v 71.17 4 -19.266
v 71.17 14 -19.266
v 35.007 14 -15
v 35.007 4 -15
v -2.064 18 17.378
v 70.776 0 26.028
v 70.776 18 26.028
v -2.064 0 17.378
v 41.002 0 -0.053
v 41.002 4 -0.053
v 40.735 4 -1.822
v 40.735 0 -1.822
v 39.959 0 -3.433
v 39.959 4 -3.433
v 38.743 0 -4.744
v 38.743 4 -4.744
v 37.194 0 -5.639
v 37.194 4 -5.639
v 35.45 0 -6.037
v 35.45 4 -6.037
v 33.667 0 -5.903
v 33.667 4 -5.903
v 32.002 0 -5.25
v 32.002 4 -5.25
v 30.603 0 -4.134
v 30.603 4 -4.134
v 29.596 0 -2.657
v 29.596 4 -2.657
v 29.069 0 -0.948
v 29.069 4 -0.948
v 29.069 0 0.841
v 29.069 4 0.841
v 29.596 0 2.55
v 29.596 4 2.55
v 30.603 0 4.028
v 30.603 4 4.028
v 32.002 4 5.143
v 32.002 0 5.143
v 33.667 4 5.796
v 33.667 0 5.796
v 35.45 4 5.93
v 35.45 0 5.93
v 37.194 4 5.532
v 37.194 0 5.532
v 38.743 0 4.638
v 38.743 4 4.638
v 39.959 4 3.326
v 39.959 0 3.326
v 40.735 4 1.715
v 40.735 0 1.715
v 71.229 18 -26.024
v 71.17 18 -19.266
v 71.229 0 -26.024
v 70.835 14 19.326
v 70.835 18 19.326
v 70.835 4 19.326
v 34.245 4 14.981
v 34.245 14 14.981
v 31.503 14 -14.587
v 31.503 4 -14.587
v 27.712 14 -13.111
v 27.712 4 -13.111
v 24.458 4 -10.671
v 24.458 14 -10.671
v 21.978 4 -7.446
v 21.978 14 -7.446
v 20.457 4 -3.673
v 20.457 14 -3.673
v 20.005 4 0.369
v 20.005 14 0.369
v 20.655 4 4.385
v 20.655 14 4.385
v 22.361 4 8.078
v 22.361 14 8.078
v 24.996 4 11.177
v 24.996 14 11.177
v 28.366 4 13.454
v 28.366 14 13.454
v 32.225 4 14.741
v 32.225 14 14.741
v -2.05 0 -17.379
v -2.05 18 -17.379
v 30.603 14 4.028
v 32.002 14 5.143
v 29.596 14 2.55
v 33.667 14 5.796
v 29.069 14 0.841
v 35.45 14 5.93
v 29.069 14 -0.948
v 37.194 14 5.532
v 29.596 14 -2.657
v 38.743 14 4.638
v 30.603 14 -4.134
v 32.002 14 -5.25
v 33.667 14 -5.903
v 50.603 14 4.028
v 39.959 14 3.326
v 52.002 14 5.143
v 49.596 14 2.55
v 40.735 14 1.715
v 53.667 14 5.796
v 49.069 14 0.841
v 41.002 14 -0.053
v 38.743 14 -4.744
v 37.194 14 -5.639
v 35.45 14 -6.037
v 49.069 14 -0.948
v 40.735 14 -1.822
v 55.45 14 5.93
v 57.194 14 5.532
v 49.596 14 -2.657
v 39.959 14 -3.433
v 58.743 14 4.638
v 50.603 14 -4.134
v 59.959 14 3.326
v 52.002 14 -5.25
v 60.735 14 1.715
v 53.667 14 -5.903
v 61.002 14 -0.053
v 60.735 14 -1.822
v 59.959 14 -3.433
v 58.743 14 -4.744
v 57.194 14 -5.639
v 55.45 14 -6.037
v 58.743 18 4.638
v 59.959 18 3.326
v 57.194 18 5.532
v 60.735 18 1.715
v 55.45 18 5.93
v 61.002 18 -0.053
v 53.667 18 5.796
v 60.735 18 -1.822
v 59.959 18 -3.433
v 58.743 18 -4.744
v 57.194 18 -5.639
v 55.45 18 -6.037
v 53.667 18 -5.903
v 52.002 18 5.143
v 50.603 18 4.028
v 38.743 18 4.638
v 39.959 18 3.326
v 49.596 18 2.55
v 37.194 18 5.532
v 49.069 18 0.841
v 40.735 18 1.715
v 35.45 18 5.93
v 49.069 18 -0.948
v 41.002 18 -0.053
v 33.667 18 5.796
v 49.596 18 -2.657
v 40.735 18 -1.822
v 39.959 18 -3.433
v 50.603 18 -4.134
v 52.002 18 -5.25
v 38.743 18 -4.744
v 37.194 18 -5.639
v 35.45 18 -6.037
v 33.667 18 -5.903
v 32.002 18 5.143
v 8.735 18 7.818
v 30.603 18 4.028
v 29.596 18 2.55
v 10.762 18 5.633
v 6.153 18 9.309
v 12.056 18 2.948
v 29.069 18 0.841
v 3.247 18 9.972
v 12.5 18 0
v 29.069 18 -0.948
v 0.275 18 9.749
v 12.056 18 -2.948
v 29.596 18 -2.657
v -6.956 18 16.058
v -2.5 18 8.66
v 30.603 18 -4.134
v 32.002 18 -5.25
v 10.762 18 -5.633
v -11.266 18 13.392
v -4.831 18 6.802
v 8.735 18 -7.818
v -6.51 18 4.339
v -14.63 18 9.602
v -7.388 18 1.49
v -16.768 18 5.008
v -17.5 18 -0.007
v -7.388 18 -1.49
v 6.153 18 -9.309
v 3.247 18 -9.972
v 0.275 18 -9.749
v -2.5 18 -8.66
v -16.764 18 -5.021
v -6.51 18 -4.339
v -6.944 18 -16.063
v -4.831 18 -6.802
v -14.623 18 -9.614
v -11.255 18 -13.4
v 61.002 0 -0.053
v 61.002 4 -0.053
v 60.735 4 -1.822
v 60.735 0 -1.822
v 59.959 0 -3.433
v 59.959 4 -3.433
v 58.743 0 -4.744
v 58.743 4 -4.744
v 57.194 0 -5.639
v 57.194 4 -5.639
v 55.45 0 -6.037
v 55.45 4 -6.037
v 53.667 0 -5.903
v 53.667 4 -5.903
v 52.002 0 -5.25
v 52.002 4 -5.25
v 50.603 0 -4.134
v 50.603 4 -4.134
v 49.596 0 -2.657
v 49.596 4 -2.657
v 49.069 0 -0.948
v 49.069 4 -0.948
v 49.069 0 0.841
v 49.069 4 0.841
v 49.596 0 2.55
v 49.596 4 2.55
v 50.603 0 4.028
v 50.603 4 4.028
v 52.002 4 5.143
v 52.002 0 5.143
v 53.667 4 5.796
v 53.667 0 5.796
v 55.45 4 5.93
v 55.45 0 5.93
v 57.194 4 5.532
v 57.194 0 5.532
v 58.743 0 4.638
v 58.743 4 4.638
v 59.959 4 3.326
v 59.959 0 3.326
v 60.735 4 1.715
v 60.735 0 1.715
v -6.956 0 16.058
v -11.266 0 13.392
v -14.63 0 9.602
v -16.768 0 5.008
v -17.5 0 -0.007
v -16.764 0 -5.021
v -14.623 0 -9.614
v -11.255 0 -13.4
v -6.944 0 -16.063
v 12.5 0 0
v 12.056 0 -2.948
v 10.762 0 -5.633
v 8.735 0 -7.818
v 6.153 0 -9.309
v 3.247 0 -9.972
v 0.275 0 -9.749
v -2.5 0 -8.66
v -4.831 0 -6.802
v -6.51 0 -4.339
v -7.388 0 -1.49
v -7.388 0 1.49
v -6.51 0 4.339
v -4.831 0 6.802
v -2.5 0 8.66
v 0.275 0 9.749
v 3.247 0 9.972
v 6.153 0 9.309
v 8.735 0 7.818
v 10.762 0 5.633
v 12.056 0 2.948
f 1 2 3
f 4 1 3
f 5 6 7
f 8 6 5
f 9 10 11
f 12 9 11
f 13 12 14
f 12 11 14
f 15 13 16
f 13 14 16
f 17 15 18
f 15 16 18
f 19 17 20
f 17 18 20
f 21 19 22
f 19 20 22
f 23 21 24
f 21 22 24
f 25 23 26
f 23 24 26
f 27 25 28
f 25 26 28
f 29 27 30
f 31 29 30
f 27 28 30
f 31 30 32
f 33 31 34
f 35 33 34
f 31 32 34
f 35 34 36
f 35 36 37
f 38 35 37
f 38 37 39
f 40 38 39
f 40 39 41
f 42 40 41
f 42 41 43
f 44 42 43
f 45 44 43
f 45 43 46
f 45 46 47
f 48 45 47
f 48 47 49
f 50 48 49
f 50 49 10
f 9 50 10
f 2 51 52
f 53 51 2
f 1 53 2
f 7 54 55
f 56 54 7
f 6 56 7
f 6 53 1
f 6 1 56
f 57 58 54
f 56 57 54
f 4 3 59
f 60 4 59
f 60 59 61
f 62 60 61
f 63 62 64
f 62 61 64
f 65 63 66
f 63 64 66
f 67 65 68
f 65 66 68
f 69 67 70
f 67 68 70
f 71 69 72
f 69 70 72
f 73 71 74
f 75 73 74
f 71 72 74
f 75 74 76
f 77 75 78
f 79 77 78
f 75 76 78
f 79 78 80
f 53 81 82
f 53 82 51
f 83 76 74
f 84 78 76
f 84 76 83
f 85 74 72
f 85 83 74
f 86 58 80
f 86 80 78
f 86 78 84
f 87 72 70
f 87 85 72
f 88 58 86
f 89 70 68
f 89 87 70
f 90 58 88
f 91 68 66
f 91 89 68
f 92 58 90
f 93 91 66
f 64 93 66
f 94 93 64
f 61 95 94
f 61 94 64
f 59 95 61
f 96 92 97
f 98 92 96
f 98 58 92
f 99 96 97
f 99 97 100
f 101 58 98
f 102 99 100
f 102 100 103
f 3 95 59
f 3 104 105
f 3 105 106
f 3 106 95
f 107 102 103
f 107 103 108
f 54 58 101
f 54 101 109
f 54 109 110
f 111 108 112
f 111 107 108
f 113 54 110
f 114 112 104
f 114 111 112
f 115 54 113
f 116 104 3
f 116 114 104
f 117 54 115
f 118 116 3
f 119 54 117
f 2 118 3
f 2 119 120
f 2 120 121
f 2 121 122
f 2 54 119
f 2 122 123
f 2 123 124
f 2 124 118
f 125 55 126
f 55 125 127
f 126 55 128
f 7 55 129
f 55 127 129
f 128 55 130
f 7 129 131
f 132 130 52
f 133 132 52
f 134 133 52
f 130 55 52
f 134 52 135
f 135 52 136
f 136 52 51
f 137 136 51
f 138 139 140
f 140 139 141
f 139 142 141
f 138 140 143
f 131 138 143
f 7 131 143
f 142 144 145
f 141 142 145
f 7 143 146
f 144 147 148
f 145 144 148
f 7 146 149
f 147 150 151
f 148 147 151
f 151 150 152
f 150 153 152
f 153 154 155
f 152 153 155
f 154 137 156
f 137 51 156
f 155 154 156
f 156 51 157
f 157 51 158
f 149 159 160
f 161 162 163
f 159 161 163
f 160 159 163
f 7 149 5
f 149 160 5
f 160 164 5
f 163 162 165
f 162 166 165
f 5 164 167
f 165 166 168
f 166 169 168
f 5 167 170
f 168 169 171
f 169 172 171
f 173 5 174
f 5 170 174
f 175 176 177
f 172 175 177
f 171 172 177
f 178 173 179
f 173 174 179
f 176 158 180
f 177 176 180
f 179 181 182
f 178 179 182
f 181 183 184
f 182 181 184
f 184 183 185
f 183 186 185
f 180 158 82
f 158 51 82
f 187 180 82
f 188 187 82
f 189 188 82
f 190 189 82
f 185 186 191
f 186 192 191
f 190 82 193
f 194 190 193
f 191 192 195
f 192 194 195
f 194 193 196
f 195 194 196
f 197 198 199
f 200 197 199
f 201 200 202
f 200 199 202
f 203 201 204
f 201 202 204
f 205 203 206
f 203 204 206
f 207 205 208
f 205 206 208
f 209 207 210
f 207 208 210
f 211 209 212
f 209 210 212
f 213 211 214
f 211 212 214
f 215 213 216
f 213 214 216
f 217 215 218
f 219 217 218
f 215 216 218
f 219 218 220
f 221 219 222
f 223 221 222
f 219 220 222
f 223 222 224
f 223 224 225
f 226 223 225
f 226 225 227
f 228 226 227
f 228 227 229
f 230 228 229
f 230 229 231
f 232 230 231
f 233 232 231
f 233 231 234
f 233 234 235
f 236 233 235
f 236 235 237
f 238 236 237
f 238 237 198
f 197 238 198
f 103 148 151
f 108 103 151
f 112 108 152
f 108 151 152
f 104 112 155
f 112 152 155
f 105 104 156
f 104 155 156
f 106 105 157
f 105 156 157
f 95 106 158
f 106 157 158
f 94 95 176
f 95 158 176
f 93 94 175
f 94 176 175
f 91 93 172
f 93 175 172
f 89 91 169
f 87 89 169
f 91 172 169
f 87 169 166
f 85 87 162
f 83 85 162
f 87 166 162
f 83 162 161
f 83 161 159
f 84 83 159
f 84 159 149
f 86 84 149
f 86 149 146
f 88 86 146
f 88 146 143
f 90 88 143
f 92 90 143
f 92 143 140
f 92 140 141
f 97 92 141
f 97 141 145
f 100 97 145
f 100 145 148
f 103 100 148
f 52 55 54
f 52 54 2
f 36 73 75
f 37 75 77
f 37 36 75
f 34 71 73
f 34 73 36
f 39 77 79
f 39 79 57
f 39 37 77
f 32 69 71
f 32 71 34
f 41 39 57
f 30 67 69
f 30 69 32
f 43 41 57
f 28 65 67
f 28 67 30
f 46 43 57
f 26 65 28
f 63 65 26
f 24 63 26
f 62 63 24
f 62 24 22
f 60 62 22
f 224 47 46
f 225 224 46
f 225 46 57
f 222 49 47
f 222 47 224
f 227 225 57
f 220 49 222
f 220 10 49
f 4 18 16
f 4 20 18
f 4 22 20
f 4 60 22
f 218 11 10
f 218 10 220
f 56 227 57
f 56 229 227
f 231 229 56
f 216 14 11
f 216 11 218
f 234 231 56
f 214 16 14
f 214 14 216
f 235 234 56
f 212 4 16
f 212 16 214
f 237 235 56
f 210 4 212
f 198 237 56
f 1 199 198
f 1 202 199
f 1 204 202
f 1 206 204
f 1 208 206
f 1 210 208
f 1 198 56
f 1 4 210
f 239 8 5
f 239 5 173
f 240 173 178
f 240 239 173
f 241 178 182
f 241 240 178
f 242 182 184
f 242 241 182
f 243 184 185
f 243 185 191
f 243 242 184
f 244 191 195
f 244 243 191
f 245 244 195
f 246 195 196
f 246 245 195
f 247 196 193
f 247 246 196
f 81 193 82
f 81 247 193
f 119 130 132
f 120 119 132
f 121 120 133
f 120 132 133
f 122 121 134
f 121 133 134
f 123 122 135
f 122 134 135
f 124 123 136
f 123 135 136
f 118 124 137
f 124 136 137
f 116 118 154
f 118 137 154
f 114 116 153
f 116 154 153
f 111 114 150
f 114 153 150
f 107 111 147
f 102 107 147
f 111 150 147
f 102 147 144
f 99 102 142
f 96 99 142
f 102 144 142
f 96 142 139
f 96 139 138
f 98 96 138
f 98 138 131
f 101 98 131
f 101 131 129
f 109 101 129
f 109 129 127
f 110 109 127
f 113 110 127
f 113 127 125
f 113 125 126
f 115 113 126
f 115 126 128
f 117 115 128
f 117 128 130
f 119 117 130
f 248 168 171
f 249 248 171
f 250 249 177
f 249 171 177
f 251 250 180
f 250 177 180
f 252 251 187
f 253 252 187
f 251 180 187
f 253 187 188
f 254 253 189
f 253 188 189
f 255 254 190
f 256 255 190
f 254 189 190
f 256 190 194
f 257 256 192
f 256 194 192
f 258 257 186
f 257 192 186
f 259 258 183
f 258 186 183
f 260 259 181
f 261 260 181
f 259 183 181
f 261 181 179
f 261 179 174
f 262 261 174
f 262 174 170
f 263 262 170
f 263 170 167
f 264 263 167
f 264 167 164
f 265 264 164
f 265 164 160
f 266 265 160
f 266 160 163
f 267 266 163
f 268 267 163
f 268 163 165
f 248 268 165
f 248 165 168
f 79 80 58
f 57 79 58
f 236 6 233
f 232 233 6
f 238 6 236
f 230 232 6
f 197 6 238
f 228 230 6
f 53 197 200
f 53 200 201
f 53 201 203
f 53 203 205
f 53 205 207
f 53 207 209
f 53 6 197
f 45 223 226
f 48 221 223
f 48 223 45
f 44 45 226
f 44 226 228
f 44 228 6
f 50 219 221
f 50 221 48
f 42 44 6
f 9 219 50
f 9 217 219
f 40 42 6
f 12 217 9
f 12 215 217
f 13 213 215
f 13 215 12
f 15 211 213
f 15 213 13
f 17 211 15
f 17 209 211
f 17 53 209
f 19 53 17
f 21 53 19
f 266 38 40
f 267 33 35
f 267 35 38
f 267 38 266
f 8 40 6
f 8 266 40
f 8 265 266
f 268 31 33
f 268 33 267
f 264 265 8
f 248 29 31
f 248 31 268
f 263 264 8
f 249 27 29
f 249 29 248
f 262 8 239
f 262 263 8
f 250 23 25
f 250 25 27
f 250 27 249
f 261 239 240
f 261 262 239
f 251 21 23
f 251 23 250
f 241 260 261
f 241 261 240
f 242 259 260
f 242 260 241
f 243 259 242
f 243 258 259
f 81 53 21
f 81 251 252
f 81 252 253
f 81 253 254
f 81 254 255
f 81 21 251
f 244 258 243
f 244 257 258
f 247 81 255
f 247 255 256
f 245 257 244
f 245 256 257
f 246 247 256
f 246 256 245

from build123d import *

# Parameters (mm, degrees)
BOSS_EXTRUDE1_DEPTH = 18
CUT_EXTRUDE1_DEPTH  = 14
SKETCH5_W           = 38.6
SKETCH5_H           = 4
BOSS_EXTRUDE2_DEPTH = 51.5
SKETCH6_R           = 10
CUT_EXTRUDE2_DEPTH  = 200
SKETCH7_R           = 6
CUT_EXTRUDE3_DEPTH  = 200


with BuildPart() as part:
    # Sketch2 → Boss-Extrude1 (new body)
    with BuildSketch(Plane(origin=(0, 0, 0), x_dir=(1, 0, 0), z_dir=(0, 1, 0))):
        with BuildLine():
            Line((-2.050203312, 17.379489819), (71.229085812, 26.024015225))
            Line((71.229085812, 26.024015225), (70.776256856, -26.027550211))
            Line((70.776256856, -26.027550211), (-2.063605293, -17.37790359))
            ThreePointArc((-2.063605293, -17.37790359), (-17.499998699, 0.006747763), (-2.050203312, 17.379489819))
        make_face()
    extrude(amount=BOSS_EXTRUDE1_DEPTH)

    # Sketch4 → Cut-Extrude1 (cut)
    with BuildSketch(Plane(origin=(0, 18, 0), x_dir=(1, 0, 0), z_dir=(0, 1, 0))):
        with BuildLine():
            Line((35.006766585, 14.999998474), (31.502988077, 14.586668832))
            ThreePointArc((31.502988077, 14.586668832), (20.004544926, -0.369225031), (32.22510993, -14.741098504))
            Line((32.22510993, -14.741098504), (34.245425362, -14.981008548))
            Line((34.245425362, -14.981008548), (70.834558469, -19.325924398))
            Line((70.834558469, -19.325924398), (71.170294461, 19.266095201))
            Line((71.170294461, 19.266095201), (35.006766585, 14.999998474))
        make_face()
    extrude(amount=-CUT_EXTRUDE1_DEPTH, mode=Mode.SUBTRACT)

    # Sketch5 → Boss-Extrude2 (add)
    with BuildSketch(Plane(origin=(70.997313391, 0, 0.617649806), x_dir=(0.008699293, 0, -0.99996216), z_dir=(0.99996216, 0, 0.008699293))):
        with Locations((0.591017469, 16)):
            Rectangle(SKETCH5_W, SKETCH5_H)
    extrude(amount=-BOSS_EXTRUDE2_DEPTH)

    # Sketch6 → Cut-Extrude2 (cut)
    with BuildSketch(Plane(origin=(0, 18, 0), x_dir=(1, 0, 0), z_dir=(0, 1, 0))):
        with Locations((2.500001301, 0)):
            Circle(SKETCH6_R)
    extrude(amount=-CUT_EXTRUDE2_DEPTH, mode=Mode.SUBTRACT)

    # Sketch7 → Cut-Extrude3 (cut)
    with BuildSketch(Plane(origin=(0, 18, 0), x_dir=(1, 0, 0), z_dir=(0, 1, 0))):
        with Locations((35.001789275, 0.053432271)):
            Circle(SKETCH7_R)
        with Locations((55.001789275, 0.053432271)):
            Circle(SKETCH7_R)
    extrude(amount=-CUT_EXTRUDE3_DEPTH, mode=Mode.SUBTRACT)


solid = part.part
